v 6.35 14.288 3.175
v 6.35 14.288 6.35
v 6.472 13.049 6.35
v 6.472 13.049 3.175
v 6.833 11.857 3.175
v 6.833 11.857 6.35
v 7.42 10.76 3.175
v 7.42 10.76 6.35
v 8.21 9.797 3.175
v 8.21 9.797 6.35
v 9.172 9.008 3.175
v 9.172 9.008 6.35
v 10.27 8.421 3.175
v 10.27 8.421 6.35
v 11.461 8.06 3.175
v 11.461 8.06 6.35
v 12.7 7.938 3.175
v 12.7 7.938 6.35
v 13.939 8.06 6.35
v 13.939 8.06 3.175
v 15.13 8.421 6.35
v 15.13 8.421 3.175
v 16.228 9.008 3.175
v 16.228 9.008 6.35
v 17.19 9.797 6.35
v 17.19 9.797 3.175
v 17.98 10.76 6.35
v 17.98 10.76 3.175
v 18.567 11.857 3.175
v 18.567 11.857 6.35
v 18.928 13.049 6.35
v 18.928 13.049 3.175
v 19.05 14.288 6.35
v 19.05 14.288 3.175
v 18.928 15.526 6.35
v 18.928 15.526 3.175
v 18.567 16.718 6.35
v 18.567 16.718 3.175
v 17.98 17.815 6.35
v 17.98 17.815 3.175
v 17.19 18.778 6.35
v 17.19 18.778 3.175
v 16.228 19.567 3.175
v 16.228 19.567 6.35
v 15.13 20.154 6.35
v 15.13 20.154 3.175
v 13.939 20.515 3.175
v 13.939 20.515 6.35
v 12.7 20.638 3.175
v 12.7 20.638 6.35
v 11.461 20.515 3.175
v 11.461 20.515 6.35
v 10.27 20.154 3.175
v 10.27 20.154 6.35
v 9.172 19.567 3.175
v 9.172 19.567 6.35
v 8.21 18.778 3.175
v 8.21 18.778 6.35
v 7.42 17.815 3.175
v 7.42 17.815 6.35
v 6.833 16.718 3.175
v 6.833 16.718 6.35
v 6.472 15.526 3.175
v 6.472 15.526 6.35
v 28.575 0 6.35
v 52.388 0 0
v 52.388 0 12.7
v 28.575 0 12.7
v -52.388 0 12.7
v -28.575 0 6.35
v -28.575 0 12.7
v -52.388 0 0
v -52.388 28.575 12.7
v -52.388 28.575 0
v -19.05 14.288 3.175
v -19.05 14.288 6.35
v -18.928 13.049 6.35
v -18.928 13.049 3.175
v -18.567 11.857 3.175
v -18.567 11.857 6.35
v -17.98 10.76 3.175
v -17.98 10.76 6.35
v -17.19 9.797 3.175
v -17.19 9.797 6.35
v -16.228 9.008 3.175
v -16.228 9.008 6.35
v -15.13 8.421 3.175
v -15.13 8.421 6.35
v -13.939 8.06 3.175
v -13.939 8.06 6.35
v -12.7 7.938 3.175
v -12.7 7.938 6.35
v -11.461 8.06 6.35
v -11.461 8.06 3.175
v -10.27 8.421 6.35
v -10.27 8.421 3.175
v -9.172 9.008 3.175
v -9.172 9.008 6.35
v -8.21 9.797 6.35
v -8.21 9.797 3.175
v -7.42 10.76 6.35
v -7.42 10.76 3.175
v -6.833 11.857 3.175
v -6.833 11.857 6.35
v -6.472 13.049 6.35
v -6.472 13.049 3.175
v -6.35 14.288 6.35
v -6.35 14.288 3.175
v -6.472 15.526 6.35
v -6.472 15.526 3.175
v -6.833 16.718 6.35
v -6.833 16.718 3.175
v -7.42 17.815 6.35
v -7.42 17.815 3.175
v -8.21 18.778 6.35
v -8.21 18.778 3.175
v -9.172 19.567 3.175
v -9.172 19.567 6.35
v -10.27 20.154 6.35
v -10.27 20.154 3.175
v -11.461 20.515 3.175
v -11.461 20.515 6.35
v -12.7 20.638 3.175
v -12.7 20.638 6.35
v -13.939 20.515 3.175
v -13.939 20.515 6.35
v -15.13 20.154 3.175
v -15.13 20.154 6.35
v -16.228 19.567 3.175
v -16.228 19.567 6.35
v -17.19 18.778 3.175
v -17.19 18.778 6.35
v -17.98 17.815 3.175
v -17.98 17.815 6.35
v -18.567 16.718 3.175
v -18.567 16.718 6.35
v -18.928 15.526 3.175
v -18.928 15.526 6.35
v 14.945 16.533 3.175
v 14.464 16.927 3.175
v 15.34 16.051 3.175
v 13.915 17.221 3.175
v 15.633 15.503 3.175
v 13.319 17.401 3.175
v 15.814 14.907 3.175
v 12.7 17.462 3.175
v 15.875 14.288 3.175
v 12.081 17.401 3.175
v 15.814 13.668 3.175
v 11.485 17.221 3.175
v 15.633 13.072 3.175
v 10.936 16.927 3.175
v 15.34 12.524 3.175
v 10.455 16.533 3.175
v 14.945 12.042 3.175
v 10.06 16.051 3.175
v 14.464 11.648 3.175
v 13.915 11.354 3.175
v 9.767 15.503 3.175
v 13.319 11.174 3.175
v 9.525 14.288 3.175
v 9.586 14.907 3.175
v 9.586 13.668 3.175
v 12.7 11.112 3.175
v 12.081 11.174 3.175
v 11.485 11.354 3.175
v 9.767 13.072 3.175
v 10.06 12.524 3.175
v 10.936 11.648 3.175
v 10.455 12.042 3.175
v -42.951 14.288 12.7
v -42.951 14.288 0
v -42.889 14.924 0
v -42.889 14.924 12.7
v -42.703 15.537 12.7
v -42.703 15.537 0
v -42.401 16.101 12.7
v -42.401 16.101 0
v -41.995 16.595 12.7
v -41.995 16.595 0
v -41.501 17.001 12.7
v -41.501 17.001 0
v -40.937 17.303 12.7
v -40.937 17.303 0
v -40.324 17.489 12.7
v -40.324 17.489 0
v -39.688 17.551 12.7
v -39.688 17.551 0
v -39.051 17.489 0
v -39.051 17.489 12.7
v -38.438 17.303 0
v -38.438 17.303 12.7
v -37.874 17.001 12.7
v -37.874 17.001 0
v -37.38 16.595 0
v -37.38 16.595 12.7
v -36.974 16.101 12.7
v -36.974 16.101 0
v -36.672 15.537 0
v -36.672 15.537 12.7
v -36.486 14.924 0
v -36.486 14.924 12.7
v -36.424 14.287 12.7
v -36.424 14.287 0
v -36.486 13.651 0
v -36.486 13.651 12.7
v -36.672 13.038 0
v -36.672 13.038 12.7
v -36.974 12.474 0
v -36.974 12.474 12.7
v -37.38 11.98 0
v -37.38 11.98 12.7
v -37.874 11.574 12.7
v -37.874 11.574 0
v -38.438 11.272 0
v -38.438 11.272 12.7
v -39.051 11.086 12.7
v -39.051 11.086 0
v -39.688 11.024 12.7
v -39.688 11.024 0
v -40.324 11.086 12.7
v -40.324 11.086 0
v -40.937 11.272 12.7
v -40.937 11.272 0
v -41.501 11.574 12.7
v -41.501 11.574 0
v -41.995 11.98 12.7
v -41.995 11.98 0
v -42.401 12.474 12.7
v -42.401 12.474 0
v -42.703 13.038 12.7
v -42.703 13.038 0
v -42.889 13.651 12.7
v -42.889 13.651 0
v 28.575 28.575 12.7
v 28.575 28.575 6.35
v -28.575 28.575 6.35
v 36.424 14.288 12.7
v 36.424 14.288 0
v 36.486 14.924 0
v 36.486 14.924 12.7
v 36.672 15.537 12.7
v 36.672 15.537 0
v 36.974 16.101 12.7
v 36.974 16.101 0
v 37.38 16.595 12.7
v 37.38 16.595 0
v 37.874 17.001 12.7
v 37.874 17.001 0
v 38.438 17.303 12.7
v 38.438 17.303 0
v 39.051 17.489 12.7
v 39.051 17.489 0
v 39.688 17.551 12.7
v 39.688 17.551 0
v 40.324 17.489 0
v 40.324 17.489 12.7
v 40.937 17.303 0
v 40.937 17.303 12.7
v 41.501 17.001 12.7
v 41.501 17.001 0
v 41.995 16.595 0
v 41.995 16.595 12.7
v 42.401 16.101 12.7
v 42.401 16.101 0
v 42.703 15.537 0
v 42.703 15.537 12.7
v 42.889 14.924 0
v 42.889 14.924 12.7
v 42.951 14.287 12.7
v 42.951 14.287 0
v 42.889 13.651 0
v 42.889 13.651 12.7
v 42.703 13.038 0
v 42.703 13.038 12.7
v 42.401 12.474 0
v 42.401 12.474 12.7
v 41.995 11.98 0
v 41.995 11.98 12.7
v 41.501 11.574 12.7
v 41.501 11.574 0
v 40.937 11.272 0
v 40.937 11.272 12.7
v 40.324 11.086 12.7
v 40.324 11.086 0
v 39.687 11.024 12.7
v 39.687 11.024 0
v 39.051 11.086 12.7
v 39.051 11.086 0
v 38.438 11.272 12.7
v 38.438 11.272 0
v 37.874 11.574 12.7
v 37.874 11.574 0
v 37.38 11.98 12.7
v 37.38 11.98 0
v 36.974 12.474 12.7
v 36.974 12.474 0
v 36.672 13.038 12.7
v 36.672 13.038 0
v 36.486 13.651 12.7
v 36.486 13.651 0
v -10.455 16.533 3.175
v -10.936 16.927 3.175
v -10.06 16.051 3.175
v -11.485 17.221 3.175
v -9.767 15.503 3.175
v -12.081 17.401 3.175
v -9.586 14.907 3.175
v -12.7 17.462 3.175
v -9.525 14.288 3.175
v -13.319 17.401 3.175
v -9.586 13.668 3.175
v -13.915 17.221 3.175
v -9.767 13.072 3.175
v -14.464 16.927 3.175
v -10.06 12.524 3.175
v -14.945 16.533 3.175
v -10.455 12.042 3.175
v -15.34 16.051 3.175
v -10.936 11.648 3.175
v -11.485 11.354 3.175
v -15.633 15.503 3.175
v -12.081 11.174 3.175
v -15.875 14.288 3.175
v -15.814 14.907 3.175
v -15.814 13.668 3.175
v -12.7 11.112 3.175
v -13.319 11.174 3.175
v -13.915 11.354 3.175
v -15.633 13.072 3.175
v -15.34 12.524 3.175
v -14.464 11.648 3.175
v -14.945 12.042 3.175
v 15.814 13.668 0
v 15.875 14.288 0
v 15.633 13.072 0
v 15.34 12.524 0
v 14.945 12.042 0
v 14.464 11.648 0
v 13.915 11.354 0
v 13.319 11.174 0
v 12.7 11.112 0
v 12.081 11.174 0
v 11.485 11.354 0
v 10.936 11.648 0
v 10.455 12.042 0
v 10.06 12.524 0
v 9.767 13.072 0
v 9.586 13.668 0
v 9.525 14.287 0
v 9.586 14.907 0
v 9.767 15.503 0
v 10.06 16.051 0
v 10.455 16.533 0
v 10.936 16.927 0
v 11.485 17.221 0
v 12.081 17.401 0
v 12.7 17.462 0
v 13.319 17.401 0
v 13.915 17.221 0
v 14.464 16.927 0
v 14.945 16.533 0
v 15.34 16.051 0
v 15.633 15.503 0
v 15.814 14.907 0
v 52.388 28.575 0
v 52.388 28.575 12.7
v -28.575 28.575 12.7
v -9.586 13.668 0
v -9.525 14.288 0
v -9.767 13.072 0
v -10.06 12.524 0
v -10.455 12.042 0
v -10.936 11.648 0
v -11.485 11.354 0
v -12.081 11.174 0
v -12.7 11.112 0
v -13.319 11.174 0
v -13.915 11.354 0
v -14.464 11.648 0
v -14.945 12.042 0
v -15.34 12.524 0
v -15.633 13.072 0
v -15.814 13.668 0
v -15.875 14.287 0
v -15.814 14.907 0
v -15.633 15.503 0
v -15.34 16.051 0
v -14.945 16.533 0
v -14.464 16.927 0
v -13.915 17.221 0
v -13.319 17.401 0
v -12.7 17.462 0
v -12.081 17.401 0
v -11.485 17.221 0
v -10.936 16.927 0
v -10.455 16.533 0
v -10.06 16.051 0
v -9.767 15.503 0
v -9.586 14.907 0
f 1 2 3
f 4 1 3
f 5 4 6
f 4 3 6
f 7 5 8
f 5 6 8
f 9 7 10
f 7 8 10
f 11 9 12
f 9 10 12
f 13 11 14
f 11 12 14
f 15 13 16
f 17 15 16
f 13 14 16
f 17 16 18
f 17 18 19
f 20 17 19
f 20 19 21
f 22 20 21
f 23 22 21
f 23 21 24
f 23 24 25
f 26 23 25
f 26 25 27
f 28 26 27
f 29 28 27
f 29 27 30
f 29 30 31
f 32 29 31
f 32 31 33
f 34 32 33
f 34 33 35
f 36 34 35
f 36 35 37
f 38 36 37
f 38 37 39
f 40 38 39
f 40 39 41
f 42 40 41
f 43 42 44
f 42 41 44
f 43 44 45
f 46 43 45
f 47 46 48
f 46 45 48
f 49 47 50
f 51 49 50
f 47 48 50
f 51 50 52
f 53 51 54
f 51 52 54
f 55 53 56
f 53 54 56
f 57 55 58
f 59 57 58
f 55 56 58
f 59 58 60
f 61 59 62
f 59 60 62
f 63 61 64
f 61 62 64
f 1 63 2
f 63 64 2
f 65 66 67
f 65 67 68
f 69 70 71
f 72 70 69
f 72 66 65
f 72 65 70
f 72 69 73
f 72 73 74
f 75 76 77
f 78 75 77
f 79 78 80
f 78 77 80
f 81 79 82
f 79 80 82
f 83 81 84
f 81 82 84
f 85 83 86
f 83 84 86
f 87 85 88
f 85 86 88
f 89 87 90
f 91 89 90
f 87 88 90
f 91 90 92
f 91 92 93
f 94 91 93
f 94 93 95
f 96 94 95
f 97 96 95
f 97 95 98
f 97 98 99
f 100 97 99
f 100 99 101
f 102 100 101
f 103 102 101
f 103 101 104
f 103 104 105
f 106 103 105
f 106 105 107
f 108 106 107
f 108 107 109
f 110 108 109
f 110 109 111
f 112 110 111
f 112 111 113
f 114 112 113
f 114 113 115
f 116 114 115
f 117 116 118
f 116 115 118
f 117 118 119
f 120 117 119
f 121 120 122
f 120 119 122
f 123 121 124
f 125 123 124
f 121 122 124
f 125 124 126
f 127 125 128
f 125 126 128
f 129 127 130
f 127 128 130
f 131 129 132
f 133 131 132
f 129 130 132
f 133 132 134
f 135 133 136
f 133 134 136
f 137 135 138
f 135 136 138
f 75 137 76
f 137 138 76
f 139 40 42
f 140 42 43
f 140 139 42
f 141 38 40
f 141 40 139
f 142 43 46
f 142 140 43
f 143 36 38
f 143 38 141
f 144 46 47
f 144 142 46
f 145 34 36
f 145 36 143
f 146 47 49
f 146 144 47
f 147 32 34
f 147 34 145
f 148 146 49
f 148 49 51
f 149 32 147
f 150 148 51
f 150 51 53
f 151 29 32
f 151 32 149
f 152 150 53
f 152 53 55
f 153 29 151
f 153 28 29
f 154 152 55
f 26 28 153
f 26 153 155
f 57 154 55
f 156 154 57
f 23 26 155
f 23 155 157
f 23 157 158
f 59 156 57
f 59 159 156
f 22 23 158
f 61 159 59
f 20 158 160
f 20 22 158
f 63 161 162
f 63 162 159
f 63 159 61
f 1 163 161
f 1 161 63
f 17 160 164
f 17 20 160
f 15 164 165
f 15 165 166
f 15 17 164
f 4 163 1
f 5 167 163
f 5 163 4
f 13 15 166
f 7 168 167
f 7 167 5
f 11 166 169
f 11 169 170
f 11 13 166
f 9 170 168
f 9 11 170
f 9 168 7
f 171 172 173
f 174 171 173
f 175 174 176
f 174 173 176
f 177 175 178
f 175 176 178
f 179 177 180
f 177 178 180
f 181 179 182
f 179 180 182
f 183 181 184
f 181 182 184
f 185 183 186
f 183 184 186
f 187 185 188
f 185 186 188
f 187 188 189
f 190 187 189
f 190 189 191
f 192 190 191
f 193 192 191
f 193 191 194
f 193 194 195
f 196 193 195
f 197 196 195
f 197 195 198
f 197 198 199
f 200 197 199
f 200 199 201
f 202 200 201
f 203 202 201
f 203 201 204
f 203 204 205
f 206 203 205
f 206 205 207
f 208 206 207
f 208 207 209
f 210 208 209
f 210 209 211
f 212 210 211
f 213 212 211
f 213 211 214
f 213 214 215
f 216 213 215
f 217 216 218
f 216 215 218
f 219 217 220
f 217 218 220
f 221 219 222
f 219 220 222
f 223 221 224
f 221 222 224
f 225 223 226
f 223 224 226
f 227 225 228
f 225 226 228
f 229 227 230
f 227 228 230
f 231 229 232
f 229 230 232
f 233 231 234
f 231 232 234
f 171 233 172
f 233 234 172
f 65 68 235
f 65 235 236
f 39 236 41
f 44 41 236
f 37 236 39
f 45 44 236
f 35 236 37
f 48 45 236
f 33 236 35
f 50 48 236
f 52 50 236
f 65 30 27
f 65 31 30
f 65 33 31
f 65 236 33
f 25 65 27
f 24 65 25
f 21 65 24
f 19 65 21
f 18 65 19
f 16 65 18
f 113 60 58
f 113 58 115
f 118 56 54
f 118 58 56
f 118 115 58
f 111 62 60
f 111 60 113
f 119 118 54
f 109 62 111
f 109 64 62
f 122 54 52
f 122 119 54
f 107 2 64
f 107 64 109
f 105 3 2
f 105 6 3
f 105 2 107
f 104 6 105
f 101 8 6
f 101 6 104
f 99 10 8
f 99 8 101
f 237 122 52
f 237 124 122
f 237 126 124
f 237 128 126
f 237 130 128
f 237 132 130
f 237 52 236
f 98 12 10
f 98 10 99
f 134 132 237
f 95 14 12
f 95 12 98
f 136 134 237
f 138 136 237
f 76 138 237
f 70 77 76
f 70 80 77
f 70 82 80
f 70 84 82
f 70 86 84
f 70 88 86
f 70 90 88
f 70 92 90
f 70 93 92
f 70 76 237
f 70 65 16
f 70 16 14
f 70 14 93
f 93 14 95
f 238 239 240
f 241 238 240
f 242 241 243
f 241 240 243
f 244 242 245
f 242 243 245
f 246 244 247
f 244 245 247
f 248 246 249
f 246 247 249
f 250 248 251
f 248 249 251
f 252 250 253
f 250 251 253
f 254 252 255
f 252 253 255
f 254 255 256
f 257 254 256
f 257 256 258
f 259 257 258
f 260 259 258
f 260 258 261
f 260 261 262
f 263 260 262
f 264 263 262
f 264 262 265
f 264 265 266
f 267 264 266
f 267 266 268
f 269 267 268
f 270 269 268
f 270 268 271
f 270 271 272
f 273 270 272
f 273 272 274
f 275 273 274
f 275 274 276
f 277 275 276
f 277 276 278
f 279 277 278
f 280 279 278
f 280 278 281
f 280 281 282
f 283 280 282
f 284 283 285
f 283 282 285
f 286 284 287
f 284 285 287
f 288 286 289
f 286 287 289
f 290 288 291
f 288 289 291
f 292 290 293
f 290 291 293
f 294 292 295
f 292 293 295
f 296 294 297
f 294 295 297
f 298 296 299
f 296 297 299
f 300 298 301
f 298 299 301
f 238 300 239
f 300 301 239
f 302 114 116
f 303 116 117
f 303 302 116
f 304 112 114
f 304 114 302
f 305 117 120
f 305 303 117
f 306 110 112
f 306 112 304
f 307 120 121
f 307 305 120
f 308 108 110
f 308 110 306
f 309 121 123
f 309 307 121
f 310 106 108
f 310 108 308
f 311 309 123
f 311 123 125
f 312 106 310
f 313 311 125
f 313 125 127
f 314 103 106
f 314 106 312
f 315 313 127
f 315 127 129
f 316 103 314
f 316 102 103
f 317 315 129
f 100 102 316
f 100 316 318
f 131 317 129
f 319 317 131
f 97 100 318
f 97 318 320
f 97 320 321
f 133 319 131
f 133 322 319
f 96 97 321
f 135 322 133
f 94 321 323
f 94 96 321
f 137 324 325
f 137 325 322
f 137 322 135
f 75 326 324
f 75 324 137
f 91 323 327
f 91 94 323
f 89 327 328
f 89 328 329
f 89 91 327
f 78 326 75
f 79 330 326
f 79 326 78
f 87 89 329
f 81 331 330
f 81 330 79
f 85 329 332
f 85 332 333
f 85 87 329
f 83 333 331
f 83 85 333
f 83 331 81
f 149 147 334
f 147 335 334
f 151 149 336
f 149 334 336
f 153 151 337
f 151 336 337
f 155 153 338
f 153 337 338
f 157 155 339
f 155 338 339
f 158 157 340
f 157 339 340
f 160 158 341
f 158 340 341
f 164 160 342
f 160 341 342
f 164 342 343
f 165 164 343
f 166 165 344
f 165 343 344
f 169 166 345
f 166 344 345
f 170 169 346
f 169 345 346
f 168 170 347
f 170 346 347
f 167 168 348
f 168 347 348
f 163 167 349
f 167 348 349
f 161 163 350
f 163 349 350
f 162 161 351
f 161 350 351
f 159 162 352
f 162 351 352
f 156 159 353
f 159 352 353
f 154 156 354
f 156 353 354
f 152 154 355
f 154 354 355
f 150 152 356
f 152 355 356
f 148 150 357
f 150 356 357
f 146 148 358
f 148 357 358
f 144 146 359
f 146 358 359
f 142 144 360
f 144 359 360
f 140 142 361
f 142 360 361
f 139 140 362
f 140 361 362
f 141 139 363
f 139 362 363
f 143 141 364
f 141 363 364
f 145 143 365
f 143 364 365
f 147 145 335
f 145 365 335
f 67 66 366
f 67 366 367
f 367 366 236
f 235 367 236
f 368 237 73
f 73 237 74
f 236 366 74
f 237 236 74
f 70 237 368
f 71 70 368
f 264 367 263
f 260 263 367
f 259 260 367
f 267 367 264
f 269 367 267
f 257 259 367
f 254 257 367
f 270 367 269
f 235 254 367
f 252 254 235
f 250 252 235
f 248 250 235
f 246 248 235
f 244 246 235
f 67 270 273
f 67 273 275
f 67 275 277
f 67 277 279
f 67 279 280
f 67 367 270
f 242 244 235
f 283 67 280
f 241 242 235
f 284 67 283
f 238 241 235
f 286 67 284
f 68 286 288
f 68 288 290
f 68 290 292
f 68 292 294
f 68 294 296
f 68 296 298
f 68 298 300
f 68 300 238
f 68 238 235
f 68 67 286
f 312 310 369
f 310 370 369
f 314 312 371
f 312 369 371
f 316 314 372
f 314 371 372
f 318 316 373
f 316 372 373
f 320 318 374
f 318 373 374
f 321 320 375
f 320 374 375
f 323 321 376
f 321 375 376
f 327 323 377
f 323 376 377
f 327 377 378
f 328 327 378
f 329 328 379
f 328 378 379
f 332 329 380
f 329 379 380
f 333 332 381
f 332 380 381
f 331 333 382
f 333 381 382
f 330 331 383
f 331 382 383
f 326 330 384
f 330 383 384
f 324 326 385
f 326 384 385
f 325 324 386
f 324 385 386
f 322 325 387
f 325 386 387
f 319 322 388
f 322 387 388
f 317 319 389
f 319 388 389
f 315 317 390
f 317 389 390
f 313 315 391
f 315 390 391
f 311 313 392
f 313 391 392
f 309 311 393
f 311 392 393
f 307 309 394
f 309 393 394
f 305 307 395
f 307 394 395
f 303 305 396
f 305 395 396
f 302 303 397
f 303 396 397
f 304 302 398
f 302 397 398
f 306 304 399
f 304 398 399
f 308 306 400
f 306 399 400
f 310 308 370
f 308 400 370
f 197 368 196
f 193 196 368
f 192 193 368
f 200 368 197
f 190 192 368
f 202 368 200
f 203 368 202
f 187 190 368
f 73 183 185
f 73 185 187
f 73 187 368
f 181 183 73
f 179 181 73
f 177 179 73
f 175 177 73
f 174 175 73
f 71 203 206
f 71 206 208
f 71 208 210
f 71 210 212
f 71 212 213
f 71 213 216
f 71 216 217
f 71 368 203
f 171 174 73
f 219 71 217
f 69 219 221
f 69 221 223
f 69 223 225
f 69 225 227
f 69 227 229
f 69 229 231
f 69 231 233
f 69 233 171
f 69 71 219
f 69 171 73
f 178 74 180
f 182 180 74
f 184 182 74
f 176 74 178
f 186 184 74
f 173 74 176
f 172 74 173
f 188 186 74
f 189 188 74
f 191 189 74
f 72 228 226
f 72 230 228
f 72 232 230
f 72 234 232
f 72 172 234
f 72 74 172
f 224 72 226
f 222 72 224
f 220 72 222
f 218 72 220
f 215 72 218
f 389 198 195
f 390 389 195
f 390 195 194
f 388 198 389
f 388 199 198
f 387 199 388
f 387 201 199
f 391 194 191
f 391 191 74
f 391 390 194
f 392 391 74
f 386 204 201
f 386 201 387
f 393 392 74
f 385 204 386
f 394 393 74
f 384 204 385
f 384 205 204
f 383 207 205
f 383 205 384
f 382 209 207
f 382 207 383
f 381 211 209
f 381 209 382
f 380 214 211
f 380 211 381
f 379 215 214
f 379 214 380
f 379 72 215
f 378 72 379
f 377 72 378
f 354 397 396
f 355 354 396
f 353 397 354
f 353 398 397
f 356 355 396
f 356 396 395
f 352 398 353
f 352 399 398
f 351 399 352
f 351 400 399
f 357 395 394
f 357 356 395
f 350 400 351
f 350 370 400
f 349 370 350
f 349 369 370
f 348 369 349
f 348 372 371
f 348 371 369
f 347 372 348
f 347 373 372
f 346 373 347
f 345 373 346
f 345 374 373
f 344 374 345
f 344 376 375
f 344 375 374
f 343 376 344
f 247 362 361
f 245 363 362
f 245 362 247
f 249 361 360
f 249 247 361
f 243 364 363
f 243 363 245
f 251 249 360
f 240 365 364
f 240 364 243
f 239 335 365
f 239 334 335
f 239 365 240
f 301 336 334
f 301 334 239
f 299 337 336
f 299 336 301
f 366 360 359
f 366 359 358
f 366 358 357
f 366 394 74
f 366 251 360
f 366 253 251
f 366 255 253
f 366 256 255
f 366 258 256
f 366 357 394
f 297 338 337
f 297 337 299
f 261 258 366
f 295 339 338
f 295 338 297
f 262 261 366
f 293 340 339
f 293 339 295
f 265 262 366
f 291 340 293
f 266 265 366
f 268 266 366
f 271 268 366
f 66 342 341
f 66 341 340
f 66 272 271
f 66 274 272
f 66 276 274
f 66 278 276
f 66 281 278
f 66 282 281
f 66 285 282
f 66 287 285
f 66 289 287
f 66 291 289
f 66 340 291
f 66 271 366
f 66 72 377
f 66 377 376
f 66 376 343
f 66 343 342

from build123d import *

# Parameters (mm, degrees)
BOSS_EXTRUDE1_DEPTH      = 28.575
HOLE1_D                  = 6.35
HOLE1_DEPTH              = 6.35
HOLE1_CBORE_D            = 12.7
HOLE1_CBORE_DEPTH        = 3.175
HOLE1_TIP                = 1.907732465
F_5_16_18_TAPPED_HOLE1_D = 6.5278


with BuildPart() as part:
    # Sketch1 → Boss-Extrude1 (new body)
    with BuildSketch(Plane(origin=(0, 0, 0), x_dir=(1, 0, 0), z_dir=(0, 1, 0))):
        Polygon((-52.3875, 0), (52.3875, 0), (52.3875, -12.7), (28.575, -12.7), (28.575, -6.35), (-28.575, -6.35), (-28.575, -12.7), (-52.3875, -12.7), align=None)
    extrude(amount=BOSS_EXTRUDE1_DEPTH)

    # Hole1
    with Locations(Plane(origin=(0, 0, 6.35), x_dir=(-1, 0, 0), z_dir=(0, 0, 1))):
        with Locations((-12.7, -14.2875), (12.7, -14.2875)):
            CounterBoreHole(HOLE1_D / 2, HOLE1_CBORE_D / 2, HOLE1_CBORE_DEPTH, depth=HOLE1_DEPTH)
            with Locations((0, 0, -(HOLE1_DEPTH + HOLE1_TIP / 2))):  # 118° drill point
                Cone(0, HOLE1_D / 2, HOLE1_TIP, mode=Mode.SUBTRACT)

    # 5/16-18 Tapped Hole1 (through all)
    with Locations(Plane.XY.offset(12.7)):
        with Locations((-39.6875, 14.2875), (39.6875, 14.2875)):
            Hole(F_5_16_18_TAPPED_HOLE1_D / 2)


solid = part.part
